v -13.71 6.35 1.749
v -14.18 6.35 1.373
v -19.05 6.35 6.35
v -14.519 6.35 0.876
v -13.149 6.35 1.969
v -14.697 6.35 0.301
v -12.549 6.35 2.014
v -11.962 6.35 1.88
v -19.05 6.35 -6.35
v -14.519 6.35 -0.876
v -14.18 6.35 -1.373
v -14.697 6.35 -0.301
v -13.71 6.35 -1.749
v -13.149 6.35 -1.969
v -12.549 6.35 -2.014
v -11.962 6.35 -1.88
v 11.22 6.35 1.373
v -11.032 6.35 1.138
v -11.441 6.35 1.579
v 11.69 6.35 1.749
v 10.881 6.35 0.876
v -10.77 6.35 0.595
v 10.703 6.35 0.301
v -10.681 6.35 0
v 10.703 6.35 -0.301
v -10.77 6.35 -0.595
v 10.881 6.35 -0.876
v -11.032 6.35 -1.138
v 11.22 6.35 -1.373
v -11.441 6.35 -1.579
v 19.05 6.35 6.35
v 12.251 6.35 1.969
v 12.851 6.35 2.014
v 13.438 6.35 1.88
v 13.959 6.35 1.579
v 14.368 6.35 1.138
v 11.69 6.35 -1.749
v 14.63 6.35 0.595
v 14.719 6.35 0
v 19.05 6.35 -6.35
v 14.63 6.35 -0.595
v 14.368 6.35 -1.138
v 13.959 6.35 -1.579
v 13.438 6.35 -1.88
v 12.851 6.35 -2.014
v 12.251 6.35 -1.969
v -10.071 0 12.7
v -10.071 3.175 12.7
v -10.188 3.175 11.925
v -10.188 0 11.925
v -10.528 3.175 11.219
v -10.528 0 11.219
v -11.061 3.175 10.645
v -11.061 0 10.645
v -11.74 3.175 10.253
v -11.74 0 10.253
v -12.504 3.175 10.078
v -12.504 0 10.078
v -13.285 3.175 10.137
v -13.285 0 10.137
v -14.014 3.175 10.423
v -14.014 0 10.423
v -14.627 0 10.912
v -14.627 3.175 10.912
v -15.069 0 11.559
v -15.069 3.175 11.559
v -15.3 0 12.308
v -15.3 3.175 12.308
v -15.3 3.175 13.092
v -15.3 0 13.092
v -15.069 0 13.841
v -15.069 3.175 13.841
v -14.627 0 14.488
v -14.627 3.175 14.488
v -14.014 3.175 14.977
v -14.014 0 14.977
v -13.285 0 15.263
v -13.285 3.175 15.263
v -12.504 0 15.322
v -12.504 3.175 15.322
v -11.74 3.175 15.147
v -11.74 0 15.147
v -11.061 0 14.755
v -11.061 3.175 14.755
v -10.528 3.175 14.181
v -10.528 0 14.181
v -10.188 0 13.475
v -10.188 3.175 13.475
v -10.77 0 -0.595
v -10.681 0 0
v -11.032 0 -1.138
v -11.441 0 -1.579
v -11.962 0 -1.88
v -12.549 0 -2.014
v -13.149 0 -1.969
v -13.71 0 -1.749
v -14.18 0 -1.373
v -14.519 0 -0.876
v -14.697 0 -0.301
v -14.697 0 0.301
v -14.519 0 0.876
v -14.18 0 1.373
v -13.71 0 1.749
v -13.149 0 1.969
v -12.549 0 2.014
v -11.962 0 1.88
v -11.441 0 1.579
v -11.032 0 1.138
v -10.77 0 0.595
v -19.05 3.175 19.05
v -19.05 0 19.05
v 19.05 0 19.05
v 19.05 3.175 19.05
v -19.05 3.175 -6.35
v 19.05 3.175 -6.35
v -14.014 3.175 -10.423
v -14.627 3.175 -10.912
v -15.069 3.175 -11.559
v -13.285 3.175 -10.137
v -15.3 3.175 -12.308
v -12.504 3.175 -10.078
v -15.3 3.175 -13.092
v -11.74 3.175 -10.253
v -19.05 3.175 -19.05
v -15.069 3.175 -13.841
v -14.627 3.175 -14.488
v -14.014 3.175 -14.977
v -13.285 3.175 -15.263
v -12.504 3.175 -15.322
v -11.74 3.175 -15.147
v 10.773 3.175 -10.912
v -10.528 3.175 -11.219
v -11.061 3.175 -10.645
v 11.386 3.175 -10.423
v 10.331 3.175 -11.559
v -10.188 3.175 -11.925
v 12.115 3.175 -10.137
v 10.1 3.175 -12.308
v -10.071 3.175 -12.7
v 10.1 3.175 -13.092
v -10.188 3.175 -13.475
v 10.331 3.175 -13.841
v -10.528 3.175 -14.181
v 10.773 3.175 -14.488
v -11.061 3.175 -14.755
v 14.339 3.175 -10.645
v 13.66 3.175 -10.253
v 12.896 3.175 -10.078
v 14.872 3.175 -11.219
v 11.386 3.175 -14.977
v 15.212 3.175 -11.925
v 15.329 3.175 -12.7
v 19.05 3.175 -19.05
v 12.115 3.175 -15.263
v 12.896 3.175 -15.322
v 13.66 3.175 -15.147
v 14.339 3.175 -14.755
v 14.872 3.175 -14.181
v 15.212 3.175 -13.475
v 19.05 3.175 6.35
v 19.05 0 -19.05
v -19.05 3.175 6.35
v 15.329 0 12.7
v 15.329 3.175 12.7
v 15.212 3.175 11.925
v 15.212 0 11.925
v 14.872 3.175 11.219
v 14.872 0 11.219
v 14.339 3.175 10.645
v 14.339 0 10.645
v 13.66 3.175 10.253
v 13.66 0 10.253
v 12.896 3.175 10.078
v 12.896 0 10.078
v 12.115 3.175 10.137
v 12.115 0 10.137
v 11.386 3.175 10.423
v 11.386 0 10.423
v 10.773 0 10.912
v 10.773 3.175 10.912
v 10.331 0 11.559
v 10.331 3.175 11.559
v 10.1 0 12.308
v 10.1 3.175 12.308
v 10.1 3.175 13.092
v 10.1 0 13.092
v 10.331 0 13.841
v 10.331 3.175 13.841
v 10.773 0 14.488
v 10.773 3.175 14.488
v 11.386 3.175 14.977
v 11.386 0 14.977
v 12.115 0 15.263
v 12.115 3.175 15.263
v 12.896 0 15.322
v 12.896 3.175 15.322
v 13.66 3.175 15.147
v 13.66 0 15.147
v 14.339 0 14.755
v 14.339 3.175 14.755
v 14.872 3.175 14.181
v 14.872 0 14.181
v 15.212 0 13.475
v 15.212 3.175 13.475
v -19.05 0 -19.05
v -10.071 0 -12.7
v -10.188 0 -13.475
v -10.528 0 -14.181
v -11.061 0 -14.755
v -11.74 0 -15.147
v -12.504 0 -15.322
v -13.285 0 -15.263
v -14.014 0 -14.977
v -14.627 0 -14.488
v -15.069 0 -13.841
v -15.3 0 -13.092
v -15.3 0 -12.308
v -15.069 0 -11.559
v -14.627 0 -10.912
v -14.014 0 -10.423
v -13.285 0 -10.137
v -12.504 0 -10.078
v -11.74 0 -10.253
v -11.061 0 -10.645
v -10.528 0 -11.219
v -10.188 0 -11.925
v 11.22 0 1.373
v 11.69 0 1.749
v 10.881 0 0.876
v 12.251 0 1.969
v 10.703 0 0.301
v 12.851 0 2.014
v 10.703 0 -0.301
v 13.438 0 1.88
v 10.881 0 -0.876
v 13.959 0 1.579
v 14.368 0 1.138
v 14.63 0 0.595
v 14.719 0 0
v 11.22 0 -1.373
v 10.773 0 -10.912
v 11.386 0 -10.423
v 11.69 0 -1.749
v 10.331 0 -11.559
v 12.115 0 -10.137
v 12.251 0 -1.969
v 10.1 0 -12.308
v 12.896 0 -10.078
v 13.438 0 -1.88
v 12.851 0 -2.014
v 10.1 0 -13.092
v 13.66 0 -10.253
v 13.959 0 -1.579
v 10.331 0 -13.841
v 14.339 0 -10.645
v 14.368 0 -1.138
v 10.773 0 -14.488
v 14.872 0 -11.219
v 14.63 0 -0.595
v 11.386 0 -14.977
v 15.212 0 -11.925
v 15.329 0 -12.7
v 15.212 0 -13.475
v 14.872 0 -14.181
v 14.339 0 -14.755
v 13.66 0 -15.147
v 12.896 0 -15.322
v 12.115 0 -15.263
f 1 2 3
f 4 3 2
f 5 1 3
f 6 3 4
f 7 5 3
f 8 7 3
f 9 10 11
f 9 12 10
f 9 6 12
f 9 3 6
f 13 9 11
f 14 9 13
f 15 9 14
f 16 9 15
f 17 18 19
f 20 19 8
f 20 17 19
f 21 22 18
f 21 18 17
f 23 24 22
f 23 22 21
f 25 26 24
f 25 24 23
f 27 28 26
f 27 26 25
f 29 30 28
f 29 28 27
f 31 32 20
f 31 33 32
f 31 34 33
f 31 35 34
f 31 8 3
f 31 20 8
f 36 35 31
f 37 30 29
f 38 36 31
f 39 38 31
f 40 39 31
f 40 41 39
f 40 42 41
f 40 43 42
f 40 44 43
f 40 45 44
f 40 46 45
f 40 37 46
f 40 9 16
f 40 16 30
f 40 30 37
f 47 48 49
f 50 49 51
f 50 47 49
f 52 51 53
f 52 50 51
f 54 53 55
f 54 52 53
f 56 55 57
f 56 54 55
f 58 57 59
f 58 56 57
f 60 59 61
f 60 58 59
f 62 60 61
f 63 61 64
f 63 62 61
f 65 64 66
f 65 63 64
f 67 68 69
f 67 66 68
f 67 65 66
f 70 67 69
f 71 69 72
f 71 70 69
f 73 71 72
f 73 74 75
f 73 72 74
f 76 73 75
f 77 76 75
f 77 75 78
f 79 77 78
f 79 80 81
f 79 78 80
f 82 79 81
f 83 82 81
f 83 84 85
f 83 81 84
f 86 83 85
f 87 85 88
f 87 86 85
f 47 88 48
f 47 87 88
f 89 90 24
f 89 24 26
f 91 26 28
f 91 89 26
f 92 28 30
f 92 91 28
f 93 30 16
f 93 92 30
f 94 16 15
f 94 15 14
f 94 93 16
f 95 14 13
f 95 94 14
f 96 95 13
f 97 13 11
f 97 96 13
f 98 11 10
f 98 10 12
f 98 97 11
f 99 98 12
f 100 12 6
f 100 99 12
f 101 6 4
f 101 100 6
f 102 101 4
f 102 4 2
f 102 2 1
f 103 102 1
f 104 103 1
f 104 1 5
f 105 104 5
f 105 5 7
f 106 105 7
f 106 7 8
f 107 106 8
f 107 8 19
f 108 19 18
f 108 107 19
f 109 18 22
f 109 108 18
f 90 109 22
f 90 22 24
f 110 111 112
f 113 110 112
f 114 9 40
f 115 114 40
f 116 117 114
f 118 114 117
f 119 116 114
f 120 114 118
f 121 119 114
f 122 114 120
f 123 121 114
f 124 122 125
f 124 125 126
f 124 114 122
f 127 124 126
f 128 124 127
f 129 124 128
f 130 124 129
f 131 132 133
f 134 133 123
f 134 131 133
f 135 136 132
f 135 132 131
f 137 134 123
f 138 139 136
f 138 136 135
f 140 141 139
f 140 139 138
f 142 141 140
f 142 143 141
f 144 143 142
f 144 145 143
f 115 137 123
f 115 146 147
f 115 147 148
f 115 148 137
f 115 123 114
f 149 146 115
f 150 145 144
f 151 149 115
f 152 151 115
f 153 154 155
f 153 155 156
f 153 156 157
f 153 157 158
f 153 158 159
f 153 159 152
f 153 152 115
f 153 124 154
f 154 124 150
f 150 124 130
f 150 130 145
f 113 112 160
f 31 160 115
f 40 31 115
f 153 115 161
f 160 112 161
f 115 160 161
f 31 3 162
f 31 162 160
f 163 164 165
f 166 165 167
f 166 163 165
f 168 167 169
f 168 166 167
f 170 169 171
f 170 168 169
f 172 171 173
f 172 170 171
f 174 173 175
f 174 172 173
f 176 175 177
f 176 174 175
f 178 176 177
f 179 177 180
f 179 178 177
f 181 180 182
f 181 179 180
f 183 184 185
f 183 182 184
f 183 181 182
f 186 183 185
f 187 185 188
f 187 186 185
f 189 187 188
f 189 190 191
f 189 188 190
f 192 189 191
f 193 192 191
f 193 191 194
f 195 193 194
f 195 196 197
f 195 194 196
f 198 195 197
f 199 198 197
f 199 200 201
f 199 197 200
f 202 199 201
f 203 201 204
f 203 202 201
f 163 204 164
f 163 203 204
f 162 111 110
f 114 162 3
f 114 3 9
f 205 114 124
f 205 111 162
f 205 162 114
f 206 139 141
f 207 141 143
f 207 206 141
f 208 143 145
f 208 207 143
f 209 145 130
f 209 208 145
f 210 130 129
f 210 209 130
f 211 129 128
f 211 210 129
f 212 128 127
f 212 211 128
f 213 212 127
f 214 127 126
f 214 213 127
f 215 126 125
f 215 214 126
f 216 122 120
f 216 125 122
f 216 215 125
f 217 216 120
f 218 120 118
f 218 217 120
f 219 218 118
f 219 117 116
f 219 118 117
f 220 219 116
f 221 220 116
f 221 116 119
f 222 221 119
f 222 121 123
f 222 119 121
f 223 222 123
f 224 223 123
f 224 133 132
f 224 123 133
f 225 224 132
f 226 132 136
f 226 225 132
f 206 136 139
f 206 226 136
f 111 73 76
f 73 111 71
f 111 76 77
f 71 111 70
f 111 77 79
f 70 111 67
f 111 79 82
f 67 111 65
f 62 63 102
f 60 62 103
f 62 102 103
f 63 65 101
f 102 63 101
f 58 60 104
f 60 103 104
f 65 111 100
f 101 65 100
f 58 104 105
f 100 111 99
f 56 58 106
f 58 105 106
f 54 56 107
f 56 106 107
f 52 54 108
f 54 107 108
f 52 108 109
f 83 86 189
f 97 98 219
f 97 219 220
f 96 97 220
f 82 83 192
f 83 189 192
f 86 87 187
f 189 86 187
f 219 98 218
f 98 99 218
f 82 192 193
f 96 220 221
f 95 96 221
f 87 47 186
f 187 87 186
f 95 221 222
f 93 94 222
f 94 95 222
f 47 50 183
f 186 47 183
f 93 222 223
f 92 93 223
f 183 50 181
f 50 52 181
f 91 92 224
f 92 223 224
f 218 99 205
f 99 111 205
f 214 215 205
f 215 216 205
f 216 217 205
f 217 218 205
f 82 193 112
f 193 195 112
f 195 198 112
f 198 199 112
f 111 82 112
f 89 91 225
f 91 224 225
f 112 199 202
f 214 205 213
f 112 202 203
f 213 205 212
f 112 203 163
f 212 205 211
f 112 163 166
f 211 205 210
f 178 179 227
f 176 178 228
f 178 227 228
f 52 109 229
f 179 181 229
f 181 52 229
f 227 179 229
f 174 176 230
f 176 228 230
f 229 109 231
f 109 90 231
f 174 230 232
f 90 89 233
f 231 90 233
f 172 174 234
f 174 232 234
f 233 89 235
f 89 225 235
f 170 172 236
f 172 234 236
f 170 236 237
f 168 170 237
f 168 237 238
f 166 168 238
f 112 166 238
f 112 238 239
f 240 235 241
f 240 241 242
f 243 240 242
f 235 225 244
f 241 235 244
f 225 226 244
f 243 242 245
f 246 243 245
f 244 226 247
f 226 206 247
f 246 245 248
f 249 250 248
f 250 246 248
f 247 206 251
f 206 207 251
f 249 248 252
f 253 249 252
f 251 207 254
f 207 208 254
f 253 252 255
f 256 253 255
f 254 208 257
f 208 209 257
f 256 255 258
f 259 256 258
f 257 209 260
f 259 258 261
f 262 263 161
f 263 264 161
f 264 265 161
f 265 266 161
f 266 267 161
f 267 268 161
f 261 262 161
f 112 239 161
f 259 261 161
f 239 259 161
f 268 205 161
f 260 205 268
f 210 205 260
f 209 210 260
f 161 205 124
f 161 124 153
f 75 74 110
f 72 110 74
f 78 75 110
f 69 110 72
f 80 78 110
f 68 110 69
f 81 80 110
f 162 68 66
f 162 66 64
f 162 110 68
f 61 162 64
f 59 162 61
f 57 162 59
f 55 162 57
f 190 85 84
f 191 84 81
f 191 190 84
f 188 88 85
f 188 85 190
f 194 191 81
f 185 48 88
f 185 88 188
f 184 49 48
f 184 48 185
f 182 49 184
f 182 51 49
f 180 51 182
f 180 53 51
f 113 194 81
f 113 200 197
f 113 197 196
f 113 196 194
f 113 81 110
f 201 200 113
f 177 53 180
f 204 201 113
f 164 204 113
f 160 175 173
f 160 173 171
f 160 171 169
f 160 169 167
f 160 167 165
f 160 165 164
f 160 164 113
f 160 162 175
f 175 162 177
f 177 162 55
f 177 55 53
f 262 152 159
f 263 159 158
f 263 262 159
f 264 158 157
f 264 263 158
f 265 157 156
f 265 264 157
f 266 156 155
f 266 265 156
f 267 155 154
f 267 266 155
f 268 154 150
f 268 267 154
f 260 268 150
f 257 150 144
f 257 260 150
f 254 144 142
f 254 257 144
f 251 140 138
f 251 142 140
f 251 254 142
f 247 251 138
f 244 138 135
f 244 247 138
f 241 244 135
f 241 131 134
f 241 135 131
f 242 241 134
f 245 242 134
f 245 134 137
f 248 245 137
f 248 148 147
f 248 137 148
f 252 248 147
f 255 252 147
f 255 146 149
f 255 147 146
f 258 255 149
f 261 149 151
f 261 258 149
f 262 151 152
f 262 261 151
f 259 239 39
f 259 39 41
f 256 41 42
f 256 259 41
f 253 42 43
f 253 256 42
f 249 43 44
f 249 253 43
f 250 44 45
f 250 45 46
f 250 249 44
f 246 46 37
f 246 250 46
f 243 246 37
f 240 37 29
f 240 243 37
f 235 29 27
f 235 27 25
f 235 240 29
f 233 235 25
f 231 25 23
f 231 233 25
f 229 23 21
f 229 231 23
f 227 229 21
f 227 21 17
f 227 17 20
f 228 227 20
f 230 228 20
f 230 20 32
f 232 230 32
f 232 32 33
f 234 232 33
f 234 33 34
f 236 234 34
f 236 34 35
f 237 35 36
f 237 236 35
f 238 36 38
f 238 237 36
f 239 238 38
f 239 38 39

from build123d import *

# Parameters (mm, degrees)
SKETCH1_W           = 38.1
SKETCH1_H           = 38.1
SKETCH1_R           = 2.0193
SKETCH1_R_2         = 2.6289
BOSS_EXTRUDE4_DEPTH = 6.35
SKETCH12_W          = 38.1
SKETCH12_H          = 12.7
CUT_EXTRUDE7_DEPTH  = 3.175


with BuildPart() as part:
    # Sketch1 → Boss-Extrude4 (new body)
    with BuildSketch(Plane(origin=(0, 0, 0), x_dir=(1, 0, 0), z_dir=(0, 1, 0))):
        Rectangle(SKETCH1_W, SKETCH1_H)
        with Locations((-12.7, 0)):
            Circle(SKETCH1_R, mode=Mode.SUBTRACT)
        with Locations((12.7, 0)):
            Circle(SKETCH1_R, mode=Mode.SUBTRACT)
        with Locations((-12.7, 12.7)):
            Circle(SKETCH1_R_2, mode=Mode.SUBTRACT)
        with Locations((12.7, 12.7)):
            Circle(SKETCH1_R_2, mode=Mode.SUBTRACT)
        with Locations((12.7, -12.7)):
            Circle(SKETCH1_R_2, mode=Mode.SUBTRACT)
        with Locations((-12.7, -12.7)):
            Circle(SKETCH1_R_2, mode=Mode.SUBTRACT)
    extrude(amount=BOSS_EXTRUDE4_DEPTH)

    # Sketch12 → Cut-Extrude7 (cut)
    with BuildSketch(Plane(origin=(0, 6.35, 0), x_dir=(1, 0, 0), z_dir=(0, 1, 0))):
        with Locations((0, 12.7)):
            Rectangle(SKETCH12_W, SKETCH12_H)
        with Locations((0, -12.7)):
            Rectangle(SKETCH12_W, SKETCH12_H)
    extrude(amount=-CUT_EXTRUDE7_DEPTH, mode=Mode.SUBTRACT)


solid = part.part
